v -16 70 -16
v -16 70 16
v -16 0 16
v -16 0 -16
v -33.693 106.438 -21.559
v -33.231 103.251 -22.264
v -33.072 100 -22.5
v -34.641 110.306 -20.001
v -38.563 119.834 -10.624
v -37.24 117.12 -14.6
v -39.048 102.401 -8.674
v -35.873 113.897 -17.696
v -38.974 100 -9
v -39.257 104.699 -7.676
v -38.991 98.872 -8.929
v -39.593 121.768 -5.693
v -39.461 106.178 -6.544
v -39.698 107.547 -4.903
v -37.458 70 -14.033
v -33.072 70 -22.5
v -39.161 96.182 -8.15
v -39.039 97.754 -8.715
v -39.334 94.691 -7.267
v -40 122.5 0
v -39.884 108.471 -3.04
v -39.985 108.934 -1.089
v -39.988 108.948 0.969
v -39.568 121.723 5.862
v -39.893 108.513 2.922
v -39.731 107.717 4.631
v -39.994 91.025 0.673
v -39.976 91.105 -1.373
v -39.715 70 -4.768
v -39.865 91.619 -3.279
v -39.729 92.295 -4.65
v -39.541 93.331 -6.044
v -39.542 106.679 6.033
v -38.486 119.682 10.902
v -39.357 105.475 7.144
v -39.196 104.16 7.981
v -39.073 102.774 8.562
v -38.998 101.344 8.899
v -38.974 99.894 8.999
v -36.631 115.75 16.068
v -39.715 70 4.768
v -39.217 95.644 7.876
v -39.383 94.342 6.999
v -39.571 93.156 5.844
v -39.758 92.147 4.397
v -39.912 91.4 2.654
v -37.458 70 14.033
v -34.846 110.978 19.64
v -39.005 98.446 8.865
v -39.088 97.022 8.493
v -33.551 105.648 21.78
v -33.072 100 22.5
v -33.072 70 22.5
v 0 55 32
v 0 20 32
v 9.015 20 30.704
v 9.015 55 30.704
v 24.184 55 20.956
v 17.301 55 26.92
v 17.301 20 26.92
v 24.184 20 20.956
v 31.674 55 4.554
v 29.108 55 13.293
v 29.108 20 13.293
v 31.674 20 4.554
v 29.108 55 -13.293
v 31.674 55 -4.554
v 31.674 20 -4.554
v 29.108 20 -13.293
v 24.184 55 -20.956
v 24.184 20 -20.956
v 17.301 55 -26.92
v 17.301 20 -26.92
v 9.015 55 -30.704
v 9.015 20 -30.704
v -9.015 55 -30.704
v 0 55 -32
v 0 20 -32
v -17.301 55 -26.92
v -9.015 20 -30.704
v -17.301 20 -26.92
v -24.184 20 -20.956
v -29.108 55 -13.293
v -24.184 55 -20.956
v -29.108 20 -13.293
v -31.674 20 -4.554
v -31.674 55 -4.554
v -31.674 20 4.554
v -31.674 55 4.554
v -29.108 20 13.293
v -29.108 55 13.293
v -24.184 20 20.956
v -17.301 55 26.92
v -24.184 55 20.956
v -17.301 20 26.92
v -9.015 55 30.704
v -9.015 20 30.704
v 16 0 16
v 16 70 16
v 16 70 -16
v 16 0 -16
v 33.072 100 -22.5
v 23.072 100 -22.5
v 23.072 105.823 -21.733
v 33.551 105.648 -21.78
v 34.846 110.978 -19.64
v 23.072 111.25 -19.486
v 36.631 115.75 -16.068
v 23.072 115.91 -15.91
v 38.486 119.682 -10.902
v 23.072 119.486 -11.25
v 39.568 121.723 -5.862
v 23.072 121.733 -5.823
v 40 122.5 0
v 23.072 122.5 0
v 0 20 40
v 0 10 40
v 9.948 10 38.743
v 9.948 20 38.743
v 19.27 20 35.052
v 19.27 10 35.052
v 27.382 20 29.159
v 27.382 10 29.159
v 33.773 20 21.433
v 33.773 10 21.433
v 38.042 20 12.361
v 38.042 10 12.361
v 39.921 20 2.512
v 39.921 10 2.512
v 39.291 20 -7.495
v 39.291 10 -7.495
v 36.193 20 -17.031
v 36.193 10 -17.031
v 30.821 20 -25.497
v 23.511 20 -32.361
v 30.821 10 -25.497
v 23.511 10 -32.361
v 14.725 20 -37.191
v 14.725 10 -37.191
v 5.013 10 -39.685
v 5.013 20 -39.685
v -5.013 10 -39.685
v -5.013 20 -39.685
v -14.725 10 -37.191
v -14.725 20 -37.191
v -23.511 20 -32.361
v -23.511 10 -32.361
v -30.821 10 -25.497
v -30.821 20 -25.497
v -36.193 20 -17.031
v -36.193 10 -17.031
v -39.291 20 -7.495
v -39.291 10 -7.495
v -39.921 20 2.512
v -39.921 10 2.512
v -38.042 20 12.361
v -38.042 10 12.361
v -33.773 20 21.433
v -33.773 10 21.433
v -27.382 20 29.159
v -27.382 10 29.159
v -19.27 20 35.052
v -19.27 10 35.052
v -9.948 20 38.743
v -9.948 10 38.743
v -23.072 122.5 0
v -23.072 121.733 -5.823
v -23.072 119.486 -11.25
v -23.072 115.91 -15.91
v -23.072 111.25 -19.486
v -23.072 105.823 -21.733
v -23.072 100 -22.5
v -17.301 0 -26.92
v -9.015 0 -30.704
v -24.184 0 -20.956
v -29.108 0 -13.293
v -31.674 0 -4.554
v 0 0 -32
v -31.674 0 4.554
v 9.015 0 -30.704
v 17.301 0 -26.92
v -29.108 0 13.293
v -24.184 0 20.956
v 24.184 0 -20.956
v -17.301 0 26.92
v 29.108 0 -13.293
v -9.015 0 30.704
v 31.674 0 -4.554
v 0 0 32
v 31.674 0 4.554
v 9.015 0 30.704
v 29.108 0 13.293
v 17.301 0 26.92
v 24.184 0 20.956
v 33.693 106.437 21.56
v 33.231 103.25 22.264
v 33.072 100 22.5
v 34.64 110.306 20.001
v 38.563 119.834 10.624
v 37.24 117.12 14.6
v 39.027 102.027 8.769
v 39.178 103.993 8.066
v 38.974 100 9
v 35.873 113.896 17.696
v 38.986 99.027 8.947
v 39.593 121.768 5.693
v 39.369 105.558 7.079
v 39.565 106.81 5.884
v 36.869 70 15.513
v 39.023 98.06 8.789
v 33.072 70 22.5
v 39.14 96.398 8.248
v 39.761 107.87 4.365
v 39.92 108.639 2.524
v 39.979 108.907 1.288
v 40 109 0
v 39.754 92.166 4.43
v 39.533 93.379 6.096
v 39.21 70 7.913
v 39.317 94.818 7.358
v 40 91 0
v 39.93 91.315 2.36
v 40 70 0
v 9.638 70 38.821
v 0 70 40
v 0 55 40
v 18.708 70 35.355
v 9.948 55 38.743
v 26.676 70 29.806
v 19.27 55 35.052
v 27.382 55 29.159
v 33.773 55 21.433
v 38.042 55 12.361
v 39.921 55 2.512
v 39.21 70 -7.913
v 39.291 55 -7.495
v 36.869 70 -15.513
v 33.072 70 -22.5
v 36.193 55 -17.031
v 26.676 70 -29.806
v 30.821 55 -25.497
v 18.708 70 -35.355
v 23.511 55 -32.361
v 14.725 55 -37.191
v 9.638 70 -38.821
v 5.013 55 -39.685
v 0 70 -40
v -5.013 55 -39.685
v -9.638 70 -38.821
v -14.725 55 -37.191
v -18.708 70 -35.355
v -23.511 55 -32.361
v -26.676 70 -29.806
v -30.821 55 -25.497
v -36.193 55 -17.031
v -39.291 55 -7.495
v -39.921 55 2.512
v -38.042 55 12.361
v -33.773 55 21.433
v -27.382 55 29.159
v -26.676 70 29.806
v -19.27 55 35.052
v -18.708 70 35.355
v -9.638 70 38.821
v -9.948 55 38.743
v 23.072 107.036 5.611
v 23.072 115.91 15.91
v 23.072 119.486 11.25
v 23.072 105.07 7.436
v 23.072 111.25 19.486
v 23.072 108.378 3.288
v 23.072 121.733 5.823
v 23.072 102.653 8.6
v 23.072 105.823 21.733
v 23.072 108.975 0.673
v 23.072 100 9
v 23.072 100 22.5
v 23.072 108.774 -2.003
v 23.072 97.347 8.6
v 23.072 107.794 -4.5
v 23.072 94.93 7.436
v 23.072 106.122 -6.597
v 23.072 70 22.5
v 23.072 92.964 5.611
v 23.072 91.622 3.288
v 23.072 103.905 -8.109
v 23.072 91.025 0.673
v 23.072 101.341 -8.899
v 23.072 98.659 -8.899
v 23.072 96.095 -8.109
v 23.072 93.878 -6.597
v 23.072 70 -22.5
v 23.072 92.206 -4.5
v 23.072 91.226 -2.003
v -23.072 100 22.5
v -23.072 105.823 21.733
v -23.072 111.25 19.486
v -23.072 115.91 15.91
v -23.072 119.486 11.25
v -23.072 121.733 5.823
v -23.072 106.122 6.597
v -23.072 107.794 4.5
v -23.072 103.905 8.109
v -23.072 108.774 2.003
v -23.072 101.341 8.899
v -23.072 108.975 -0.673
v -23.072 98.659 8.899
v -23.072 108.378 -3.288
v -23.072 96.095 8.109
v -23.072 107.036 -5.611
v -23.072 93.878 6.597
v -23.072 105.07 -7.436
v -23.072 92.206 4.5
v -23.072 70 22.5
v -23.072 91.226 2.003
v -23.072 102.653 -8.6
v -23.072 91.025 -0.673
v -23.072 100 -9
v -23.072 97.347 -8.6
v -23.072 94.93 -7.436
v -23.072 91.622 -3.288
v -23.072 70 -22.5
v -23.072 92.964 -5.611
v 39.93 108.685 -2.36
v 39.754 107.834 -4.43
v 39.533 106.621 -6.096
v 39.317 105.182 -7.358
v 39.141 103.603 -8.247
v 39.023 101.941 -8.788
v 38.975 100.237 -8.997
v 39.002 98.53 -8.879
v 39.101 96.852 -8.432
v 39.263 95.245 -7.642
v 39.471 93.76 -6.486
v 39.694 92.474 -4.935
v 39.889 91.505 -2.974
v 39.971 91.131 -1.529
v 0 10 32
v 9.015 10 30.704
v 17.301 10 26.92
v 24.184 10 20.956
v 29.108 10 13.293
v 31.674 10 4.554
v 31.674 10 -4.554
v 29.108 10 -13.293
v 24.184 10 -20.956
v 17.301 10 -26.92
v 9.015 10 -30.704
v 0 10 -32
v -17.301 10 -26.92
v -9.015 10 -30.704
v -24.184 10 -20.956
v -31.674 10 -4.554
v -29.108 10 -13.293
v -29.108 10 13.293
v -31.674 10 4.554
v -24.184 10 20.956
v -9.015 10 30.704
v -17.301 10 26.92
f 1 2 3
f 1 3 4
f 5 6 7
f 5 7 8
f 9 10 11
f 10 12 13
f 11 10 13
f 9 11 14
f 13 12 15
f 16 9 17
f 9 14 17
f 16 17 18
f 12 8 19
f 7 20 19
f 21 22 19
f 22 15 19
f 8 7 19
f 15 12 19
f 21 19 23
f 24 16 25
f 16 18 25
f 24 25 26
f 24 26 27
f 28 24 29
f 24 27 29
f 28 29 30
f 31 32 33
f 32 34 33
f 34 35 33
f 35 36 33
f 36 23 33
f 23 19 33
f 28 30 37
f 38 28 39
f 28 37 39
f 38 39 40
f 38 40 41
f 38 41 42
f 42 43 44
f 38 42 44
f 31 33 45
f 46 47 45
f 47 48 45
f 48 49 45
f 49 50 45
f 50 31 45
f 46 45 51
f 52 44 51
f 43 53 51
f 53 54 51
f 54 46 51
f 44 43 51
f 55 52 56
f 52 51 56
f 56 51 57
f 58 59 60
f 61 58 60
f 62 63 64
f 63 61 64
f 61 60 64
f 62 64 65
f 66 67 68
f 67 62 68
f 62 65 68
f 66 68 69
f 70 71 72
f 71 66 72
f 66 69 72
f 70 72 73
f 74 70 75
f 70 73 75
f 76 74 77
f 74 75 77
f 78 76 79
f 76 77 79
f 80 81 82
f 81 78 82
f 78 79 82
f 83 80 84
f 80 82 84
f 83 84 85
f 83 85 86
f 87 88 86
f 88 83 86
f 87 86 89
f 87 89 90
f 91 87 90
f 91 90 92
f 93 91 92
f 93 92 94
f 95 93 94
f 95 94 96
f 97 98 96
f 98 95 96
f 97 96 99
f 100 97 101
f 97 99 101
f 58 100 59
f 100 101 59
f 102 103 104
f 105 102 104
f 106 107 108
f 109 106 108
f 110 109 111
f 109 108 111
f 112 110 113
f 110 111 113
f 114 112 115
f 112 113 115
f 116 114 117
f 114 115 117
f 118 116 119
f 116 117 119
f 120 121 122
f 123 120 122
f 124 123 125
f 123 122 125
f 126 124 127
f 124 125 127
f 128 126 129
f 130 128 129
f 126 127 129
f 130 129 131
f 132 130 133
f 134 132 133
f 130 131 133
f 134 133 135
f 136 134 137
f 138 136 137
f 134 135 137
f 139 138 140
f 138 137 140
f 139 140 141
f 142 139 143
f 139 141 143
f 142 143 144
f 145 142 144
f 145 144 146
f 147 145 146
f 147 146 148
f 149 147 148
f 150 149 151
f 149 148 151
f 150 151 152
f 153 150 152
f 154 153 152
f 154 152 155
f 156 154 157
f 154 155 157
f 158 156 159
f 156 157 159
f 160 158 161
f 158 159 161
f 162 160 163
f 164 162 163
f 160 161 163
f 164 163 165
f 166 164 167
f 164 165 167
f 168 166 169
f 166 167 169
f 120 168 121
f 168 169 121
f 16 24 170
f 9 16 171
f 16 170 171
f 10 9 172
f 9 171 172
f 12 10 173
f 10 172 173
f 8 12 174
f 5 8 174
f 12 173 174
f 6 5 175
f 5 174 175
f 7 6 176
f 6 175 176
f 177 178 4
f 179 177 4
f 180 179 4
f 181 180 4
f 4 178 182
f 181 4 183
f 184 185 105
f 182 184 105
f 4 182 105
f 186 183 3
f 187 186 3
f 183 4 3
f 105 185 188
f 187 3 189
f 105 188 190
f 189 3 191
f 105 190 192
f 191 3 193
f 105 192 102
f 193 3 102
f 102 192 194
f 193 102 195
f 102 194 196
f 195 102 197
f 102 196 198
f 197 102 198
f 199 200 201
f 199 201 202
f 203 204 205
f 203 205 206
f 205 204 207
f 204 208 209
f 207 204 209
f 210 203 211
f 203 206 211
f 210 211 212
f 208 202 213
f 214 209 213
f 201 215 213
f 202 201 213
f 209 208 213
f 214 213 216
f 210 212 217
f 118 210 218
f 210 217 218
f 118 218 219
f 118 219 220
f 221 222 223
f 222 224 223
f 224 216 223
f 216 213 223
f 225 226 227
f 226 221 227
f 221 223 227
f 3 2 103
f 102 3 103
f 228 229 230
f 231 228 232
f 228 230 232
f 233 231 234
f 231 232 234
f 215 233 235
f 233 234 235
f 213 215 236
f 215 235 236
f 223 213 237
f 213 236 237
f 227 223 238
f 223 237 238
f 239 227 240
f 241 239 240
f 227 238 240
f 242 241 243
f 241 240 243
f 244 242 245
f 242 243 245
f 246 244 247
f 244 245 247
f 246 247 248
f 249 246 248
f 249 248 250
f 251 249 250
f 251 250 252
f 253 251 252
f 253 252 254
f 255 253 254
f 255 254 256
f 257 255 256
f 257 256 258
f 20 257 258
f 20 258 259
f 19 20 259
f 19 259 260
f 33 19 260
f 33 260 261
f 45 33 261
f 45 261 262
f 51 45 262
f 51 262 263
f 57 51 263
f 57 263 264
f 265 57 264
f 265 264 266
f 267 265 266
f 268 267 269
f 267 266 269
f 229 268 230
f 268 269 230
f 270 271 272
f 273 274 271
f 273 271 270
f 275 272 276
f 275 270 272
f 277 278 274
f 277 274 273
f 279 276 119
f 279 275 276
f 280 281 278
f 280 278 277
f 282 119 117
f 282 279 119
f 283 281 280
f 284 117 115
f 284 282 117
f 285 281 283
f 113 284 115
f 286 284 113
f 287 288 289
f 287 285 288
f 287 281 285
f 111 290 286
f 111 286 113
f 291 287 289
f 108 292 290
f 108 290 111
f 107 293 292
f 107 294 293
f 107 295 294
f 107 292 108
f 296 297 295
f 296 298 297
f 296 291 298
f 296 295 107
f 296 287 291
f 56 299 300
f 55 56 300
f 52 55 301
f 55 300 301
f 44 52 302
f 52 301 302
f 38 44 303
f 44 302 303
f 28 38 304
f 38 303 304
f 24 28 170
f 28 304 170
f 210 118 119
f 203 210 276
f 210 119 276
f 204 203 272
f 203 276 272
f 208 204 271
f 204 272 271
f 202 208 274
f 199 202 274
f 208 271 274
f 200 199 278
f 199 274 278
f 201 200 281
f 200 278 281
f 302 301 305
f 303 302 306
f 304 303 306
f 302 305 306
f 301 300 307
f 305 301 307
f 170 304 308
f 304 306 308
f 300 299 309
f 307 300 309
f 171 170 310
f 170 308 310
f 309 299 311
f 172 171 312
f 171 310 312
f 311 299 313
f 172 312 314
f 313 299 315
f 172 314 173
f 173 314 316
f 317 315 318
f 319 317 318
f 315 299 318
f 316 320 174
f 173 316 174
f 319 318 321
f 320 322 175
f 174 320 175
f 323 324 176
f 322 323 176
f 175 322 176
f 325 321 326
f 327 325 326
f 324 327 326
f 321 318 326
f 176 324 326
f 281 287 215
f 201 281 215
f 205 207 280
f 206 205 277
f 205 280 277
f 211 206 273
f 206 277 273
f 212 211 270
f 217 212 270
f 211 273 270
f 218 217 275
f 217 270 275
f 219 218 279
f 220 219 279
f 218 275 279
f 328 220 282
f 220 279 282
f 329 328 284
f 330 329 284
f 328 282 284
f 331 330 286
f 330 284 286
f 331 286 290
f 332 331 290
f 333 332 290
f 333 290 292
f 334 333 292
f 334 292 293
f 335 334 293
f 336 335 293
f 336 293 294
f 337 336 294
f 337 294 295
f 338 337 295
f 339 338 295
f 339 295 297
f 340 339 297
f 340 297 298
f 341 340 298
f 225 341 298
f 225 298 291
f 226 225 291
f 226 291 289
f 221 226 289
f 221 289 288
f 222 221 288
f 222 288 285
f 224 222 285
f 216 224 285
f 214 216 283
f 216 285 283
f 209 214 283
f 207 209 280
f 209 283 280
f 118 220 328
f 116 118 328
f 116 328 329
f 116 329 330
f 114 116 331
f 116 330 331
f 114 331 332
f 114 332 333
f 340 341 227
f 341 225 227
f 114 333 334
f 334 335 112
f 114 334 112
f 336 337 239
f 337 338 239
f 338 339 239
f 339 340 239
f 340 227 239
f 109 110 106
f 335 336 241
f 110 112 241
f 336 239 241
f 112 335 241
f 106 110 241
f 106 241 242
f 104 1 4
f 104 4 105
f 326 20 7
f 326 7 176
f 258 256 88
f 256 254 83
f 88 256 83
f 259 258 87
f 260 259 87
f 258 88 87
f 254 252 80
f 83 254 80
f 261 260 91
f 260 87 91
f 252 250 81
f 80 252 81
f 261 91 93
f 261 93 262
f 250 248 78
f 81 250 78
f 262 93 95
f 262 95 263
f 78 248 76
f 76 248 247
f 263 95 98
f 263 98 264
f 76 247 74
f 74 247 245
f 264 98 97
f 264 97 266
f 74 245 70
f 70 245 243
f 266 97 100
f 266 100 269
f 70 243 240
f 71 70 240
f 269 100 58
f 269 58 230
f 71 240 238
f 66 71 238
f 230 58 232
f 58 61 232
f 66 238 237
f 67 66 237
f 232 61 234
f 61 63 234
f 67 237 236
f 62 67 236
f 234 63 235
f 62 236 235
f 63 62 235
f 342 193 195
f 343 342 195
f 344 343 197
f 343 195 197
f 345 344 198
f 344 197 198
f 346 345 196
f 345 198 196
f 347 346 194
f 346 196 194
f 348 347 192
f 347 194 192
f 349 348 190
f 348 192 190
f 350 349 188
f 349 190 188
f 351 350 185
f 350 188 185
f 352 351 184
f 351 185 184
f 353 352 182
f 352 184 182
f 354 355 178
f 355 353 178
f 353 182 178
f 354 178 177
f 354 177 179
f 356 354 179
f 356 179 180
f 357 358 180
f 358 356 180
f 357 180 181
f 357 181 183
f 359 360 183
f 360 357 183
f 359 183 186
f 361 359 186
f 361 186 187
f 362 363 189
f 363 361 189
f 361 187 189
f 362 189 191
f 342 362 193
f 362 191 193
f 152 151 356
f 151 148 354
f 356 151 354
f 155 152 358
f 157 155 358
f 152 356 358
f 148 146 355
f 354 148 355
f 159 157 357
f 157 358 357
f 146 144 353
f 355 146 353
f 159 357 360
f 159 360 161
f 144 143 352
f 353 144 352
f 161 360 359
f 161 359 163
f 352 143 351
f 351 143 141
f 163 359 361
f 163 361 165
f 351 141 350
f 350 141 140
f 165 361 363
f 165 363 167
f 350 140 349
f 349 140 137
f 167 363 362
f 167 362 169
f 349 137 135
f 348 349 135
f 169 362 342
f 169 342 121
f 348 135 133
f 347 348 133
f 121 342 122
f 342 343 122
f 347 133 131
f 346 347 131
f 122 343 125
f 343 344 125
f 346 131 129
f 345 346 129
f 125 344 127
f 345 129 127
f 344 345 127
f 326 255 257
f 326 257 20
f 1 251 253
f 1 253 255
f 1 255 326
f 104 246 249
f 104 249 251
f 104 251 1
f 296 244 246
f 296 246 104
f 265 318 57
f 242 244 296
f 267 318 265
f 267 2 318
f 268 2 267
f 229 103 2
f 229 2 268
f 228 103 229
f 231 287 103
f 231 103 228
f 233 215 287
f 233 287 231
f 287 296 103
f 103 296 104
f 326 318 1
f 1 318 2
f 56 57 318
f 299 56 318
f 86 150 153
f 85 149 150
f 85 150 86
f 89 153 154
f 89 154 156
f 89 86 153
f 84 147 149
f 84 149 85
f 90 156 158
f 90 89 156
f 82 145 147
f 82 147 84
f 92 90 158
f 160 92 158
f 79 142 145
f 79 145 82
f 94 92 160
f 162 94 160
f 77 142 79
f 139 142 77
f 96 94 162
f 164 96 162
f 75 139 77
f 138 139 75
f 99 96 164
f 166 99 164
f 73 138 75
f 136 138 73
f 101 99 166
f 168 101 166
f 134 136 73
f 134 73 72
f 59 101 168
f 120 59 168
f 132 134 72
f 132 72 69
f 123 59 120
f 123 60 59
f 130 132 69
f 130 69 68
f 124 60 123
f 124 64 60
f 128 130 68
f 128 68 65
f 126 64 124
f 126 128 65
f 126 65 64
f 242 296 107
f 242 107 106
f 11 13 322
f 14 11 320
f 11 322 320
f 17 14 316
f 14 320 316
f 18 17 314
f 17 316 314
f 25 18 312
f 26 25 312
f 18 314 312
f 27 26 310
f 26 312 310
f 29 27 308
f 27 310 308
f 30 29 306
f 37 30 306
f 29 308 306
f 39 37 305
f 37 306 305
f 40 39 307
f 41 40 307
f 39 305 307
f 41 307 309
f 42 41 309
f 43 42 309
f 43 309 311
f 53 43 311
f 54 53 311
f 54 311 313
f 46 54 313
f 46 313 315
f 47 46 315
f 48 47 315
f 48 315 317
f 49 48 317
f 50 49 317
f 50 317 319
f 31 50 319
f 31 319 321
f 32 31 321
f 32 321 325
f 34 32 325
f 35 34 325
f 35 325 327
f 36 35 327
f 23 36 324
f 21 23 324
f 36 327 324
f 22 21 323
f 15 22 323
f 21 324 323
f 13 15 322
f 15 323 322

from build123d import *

# Parameters (mm, degrees)
IZIM1_R                     = 32
Y_KSEKLIK_EKSTR_ZYON1_DEPTH = 70
IZIM2_R                     = 40
Y_KSEKLIK_EKSTR_ZYON2_DEPTH = 10
IZIM3_R                     = 40
Y_KSEKLIK_EKSTR_ZYON3_DEPTH = 15
IZIM4_W                     = 32
IZIM4_H                     = 32
KES_EKSTR_ZYON1_DEPTH       = 91
IZIM5_W                     = 10
IZIM5_H                     = 45
Y_KSEKLIK_EKSTR_ZYON6_DEPTH = 52.5
IZIM11_R                    = 9
KES_EKSTR_ZYON2_DEPTH       = 144.472343967
KES_EKSTR_ZYON3_DEPTH       = 144.472344097


with BuildPart() as part:
    # Çizim1 → Yükseklik-Ekstrüzyon1 (new body)
    with BuildSketch(Plane(origin=(0, 0, 0), x_dir=(1, 0, 0), z_dir=(0, 1, 0))):
        with Locations(Location((0, 0, 0), (0, 0, 270))):
            Circle(IZIM1_R)
    extrude(amount=Y_KSEKLIK_EKSTR_ZYON1_DEPTH)

    # Çizim2 → Yükseklik-Ekstrüzyon2 (add)
    with BuildSketch(Plane(origin=(0, 10, 0), x_dir=(1, 0, 0), z_dir=(0, 1, 0))):
        with Locations(Location((0, 0, 0), (0, 0, 270))):
            Circle(IZIM2_R)
    extrude(amount=Y_KSEKLIK_EKSTR_ZYON2_DEPTH)

    # Çizim3 → Yükseklik-Ekstrüzyon3 (add)
    with BuildSketch(Plane(origin=(0, 55, 0), x_dir=(1, 0, 0), z_dir=(0, 1, 0))):
        with Locations(Location((0, 0, 0), (0, 0, 270))):
            Circle(IZIM3_R)
    extrude(amount=Y_KSEKLIK_EKSTR_ZYON3_DEPTH)

    # Çizim4 → Kes-Ekstrüzyon1 (cut, through all)
    with BuildSketch(Plane(origin=(0, 70, 0), x_dir=(1, 0, 0), z_dir=(0, 1, 0))):
        Rectangle(IZIM4_W, IZIM4_H)
    extrude(amount=-KES_EKSTR_ZYON1_DEPTH, mode=Mode.SUBTRACT)

    # Çizim5 → Yükseklik-Ekstrüzyon6 (add)
    with BuildSketch(Plane(origin=(0, 70, 0), x_dir=(1, 0, 0), z_dir=(0, 1, 0))):
        with Locations((-28.071891388, 0)):
            Rectangle(IZIM5_W, IZIM5_H)
        with BuildLine():
            ThreePointArc((-33.071891388, 22.5), (-40, 0), (-33.071891388, -22.5))
            Line((-33.071891388, -22.5), (-33.071891388, 22.5))
        make_face()
        with Locations((28.071891388, 0)):
            Rectangle(IZIM5_W, IZIM5_H)
        with BuildLine():
            Line((33.071891388, 22.5), (33.071891388, -22.5))
            ThreePointArc((33.071891388, -22.5), (38.228756555, -11.771243445), (40, 0))
            ThreePointArc((40, 0), (38.228756555, 11.771243445), (33.071891388, 22.5))
        make_face()
    extrude(amount=Y_KSEKLIK_EKSTR_ZYON6_DEPTH)

    # Çizim11 → Kes-Ekstrüzyon2 (cut, through all)
    with BuildSketch(Plane.ZY.offset(-23.071891388)):
        with Locations((0, 100)):
            Circle(IZIM11_R)
        with BuildLine():
            ThreePointArc((-22.5, 100), (-15.909902516, 115.909902637), (1.71e-07, 122.5))
            Line((1.71e-07, 122.5), (-22.5, 122.5))
            Line((-22.5, 122.5), (-22.5, 100))
        make_face()
        with BuildLine():
            ThreePointArc((1.71e-07, 122.5), (15.909902637, 115.909902516), (22.5, 100))
            Line((22.5, 100), (22.5, 122.5))
            Line((22.5, 122.5), (1.71e-07, 122.5))
        make_face()
    extrude(amount=-KES_EKSTR_ZYON2_DEPTH, mode=Mode.SUBTRACT)

    # Çizim12 → Kes-Ekstrüzyon3 (cut, through all)
    with BuildSketch(Plane(origin=(-23.071891388, 0, 0), x_dir=(0, 0, -1), z_dir=(1, 0, 0))):
        with BuildLine():
            ThreePointArc((-22.5, 100), (-15.90990258, 115.909902574), (-8e-09, 122.5))
            Line((-8e-09, 122.5), (-22.5, 122.5))
            Line((-22.5, 122.5), (-22.5, 100))
        make_face()
        with BuildLine():
            ThreePointArc((-9, 100), (0, 91), (9, 100))
            Line((9, 100), (-9, 100))
        make_face()
        with BuildLine():
            Line((-9, 100), (9, 100))
            ThreePointArc((9, 100), (0, 109), (-9, 100))
        make_face()
        with BuildLine():
            ThreePointArc((-8e-09, 122.5), (15.909902574, 115.90990258), (22.5, 100))
            Line((22.5, 100), (22.5, 122.5))
            Line((22.5, 122.5), (-8e-09, 122.5))
        make_face()
    extrude(amount=-KES_EKSTR_ZYON3_DEPTH, mode=Mode.SUBTRACT)


solid = part.part
